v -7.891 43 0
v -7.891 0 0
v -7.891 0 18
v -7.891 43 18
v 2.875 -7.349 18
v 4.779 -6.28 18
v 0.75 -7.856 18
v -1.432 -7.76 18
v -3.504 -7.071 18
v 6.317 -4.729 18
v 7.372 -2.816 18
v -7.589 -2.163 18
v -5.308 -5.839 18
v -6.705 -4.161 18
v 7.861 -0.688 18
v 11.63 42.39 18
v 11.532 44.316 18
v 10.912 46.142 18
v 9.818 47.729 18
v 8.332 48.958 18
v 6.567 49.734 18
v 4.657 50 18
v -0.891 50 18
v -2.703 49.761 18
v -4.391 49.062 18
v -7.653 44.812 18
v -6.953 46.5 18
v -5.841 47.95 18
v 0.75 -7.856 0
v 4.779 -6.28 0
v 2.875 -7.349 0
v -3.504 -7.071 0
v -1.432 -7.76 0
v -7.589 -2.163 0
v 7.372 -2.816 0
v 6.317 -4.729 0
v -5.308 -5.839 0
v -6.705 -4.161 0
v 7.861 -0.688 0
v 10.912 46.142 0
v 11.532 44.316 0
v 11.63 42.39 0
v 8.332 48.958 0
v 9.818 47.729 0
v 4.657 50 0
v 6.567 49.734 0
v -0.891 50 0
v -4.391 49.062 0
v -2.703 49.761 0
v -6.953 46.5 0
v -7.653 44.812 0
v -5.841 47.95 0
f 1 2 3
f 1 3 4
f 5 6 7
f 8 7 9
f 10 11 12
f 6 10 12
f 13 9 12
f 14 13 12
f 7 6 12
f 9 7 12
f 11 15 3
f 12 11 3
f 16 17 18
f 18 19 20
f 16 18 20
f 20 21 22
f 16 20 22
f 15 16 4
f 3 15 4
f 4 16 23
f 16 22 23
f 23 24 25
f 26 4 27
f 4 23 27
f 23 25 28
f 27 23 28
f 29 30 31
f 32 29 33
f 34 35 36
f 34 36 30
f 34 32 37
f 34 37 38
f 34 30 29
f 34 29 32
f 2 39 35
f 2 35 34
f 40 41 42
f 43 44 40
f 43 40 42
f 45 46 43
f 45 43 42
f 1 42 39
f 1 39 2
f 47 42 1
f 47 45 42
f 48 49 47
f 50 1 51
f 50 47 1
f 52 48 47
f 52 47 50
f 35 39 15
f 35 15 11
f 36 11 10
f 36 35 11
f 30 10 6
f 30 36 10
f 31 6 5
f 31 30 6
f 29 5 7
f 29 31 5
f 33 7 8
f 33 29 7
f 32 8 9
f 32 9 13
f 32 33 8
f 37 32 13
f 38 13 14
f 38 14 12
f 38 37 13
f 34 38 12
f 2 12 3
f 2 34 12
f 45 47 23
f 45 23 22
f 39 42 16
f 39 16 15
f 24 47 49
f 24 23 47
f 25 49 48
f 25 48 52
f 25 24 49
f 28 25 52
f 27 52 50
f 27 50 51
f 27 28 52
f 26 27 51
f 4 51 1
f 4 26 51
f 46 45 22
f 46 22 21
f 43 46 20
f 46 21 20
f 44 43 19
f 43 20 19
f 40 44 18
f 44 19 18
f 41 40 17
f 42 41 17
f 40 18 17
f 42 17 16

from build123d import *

# Parameters (mm, degrees)
BOSS_EXTRU_1_DEPTH = 18
CONG_1_R           = 7


with BuildPart() as part:
    # Esquisse2 → Boss.-Extru.1 (new body)
    with BuildSketch(Plane.XY):
        with BuildLine():
            Line((-7.891319926, 50), (12.295896662, 50))
            Line((12.295896662, 50), (7.861291071, -0.687773849))
            ThreePointArc((7.861291071, -0.687773849), (-0.344214541, -7.883809138), (-7.891319926, 0))
            Line((-7.891319926, 0), (-7.891319926, 50))
        make_face()
    extrude(amount=BOSS_EXTRU_1_DEPTH)

    # Congé1
    cong_1_edges = [part.edges().sort_by_distance(p)[0] for p in [
        (-7.891319926, 50, 9),
        (12.295896662, 50, 9),
    ]]
    fillet(cong_1_edges, radius=CONG_1_R)


solid = part.part
